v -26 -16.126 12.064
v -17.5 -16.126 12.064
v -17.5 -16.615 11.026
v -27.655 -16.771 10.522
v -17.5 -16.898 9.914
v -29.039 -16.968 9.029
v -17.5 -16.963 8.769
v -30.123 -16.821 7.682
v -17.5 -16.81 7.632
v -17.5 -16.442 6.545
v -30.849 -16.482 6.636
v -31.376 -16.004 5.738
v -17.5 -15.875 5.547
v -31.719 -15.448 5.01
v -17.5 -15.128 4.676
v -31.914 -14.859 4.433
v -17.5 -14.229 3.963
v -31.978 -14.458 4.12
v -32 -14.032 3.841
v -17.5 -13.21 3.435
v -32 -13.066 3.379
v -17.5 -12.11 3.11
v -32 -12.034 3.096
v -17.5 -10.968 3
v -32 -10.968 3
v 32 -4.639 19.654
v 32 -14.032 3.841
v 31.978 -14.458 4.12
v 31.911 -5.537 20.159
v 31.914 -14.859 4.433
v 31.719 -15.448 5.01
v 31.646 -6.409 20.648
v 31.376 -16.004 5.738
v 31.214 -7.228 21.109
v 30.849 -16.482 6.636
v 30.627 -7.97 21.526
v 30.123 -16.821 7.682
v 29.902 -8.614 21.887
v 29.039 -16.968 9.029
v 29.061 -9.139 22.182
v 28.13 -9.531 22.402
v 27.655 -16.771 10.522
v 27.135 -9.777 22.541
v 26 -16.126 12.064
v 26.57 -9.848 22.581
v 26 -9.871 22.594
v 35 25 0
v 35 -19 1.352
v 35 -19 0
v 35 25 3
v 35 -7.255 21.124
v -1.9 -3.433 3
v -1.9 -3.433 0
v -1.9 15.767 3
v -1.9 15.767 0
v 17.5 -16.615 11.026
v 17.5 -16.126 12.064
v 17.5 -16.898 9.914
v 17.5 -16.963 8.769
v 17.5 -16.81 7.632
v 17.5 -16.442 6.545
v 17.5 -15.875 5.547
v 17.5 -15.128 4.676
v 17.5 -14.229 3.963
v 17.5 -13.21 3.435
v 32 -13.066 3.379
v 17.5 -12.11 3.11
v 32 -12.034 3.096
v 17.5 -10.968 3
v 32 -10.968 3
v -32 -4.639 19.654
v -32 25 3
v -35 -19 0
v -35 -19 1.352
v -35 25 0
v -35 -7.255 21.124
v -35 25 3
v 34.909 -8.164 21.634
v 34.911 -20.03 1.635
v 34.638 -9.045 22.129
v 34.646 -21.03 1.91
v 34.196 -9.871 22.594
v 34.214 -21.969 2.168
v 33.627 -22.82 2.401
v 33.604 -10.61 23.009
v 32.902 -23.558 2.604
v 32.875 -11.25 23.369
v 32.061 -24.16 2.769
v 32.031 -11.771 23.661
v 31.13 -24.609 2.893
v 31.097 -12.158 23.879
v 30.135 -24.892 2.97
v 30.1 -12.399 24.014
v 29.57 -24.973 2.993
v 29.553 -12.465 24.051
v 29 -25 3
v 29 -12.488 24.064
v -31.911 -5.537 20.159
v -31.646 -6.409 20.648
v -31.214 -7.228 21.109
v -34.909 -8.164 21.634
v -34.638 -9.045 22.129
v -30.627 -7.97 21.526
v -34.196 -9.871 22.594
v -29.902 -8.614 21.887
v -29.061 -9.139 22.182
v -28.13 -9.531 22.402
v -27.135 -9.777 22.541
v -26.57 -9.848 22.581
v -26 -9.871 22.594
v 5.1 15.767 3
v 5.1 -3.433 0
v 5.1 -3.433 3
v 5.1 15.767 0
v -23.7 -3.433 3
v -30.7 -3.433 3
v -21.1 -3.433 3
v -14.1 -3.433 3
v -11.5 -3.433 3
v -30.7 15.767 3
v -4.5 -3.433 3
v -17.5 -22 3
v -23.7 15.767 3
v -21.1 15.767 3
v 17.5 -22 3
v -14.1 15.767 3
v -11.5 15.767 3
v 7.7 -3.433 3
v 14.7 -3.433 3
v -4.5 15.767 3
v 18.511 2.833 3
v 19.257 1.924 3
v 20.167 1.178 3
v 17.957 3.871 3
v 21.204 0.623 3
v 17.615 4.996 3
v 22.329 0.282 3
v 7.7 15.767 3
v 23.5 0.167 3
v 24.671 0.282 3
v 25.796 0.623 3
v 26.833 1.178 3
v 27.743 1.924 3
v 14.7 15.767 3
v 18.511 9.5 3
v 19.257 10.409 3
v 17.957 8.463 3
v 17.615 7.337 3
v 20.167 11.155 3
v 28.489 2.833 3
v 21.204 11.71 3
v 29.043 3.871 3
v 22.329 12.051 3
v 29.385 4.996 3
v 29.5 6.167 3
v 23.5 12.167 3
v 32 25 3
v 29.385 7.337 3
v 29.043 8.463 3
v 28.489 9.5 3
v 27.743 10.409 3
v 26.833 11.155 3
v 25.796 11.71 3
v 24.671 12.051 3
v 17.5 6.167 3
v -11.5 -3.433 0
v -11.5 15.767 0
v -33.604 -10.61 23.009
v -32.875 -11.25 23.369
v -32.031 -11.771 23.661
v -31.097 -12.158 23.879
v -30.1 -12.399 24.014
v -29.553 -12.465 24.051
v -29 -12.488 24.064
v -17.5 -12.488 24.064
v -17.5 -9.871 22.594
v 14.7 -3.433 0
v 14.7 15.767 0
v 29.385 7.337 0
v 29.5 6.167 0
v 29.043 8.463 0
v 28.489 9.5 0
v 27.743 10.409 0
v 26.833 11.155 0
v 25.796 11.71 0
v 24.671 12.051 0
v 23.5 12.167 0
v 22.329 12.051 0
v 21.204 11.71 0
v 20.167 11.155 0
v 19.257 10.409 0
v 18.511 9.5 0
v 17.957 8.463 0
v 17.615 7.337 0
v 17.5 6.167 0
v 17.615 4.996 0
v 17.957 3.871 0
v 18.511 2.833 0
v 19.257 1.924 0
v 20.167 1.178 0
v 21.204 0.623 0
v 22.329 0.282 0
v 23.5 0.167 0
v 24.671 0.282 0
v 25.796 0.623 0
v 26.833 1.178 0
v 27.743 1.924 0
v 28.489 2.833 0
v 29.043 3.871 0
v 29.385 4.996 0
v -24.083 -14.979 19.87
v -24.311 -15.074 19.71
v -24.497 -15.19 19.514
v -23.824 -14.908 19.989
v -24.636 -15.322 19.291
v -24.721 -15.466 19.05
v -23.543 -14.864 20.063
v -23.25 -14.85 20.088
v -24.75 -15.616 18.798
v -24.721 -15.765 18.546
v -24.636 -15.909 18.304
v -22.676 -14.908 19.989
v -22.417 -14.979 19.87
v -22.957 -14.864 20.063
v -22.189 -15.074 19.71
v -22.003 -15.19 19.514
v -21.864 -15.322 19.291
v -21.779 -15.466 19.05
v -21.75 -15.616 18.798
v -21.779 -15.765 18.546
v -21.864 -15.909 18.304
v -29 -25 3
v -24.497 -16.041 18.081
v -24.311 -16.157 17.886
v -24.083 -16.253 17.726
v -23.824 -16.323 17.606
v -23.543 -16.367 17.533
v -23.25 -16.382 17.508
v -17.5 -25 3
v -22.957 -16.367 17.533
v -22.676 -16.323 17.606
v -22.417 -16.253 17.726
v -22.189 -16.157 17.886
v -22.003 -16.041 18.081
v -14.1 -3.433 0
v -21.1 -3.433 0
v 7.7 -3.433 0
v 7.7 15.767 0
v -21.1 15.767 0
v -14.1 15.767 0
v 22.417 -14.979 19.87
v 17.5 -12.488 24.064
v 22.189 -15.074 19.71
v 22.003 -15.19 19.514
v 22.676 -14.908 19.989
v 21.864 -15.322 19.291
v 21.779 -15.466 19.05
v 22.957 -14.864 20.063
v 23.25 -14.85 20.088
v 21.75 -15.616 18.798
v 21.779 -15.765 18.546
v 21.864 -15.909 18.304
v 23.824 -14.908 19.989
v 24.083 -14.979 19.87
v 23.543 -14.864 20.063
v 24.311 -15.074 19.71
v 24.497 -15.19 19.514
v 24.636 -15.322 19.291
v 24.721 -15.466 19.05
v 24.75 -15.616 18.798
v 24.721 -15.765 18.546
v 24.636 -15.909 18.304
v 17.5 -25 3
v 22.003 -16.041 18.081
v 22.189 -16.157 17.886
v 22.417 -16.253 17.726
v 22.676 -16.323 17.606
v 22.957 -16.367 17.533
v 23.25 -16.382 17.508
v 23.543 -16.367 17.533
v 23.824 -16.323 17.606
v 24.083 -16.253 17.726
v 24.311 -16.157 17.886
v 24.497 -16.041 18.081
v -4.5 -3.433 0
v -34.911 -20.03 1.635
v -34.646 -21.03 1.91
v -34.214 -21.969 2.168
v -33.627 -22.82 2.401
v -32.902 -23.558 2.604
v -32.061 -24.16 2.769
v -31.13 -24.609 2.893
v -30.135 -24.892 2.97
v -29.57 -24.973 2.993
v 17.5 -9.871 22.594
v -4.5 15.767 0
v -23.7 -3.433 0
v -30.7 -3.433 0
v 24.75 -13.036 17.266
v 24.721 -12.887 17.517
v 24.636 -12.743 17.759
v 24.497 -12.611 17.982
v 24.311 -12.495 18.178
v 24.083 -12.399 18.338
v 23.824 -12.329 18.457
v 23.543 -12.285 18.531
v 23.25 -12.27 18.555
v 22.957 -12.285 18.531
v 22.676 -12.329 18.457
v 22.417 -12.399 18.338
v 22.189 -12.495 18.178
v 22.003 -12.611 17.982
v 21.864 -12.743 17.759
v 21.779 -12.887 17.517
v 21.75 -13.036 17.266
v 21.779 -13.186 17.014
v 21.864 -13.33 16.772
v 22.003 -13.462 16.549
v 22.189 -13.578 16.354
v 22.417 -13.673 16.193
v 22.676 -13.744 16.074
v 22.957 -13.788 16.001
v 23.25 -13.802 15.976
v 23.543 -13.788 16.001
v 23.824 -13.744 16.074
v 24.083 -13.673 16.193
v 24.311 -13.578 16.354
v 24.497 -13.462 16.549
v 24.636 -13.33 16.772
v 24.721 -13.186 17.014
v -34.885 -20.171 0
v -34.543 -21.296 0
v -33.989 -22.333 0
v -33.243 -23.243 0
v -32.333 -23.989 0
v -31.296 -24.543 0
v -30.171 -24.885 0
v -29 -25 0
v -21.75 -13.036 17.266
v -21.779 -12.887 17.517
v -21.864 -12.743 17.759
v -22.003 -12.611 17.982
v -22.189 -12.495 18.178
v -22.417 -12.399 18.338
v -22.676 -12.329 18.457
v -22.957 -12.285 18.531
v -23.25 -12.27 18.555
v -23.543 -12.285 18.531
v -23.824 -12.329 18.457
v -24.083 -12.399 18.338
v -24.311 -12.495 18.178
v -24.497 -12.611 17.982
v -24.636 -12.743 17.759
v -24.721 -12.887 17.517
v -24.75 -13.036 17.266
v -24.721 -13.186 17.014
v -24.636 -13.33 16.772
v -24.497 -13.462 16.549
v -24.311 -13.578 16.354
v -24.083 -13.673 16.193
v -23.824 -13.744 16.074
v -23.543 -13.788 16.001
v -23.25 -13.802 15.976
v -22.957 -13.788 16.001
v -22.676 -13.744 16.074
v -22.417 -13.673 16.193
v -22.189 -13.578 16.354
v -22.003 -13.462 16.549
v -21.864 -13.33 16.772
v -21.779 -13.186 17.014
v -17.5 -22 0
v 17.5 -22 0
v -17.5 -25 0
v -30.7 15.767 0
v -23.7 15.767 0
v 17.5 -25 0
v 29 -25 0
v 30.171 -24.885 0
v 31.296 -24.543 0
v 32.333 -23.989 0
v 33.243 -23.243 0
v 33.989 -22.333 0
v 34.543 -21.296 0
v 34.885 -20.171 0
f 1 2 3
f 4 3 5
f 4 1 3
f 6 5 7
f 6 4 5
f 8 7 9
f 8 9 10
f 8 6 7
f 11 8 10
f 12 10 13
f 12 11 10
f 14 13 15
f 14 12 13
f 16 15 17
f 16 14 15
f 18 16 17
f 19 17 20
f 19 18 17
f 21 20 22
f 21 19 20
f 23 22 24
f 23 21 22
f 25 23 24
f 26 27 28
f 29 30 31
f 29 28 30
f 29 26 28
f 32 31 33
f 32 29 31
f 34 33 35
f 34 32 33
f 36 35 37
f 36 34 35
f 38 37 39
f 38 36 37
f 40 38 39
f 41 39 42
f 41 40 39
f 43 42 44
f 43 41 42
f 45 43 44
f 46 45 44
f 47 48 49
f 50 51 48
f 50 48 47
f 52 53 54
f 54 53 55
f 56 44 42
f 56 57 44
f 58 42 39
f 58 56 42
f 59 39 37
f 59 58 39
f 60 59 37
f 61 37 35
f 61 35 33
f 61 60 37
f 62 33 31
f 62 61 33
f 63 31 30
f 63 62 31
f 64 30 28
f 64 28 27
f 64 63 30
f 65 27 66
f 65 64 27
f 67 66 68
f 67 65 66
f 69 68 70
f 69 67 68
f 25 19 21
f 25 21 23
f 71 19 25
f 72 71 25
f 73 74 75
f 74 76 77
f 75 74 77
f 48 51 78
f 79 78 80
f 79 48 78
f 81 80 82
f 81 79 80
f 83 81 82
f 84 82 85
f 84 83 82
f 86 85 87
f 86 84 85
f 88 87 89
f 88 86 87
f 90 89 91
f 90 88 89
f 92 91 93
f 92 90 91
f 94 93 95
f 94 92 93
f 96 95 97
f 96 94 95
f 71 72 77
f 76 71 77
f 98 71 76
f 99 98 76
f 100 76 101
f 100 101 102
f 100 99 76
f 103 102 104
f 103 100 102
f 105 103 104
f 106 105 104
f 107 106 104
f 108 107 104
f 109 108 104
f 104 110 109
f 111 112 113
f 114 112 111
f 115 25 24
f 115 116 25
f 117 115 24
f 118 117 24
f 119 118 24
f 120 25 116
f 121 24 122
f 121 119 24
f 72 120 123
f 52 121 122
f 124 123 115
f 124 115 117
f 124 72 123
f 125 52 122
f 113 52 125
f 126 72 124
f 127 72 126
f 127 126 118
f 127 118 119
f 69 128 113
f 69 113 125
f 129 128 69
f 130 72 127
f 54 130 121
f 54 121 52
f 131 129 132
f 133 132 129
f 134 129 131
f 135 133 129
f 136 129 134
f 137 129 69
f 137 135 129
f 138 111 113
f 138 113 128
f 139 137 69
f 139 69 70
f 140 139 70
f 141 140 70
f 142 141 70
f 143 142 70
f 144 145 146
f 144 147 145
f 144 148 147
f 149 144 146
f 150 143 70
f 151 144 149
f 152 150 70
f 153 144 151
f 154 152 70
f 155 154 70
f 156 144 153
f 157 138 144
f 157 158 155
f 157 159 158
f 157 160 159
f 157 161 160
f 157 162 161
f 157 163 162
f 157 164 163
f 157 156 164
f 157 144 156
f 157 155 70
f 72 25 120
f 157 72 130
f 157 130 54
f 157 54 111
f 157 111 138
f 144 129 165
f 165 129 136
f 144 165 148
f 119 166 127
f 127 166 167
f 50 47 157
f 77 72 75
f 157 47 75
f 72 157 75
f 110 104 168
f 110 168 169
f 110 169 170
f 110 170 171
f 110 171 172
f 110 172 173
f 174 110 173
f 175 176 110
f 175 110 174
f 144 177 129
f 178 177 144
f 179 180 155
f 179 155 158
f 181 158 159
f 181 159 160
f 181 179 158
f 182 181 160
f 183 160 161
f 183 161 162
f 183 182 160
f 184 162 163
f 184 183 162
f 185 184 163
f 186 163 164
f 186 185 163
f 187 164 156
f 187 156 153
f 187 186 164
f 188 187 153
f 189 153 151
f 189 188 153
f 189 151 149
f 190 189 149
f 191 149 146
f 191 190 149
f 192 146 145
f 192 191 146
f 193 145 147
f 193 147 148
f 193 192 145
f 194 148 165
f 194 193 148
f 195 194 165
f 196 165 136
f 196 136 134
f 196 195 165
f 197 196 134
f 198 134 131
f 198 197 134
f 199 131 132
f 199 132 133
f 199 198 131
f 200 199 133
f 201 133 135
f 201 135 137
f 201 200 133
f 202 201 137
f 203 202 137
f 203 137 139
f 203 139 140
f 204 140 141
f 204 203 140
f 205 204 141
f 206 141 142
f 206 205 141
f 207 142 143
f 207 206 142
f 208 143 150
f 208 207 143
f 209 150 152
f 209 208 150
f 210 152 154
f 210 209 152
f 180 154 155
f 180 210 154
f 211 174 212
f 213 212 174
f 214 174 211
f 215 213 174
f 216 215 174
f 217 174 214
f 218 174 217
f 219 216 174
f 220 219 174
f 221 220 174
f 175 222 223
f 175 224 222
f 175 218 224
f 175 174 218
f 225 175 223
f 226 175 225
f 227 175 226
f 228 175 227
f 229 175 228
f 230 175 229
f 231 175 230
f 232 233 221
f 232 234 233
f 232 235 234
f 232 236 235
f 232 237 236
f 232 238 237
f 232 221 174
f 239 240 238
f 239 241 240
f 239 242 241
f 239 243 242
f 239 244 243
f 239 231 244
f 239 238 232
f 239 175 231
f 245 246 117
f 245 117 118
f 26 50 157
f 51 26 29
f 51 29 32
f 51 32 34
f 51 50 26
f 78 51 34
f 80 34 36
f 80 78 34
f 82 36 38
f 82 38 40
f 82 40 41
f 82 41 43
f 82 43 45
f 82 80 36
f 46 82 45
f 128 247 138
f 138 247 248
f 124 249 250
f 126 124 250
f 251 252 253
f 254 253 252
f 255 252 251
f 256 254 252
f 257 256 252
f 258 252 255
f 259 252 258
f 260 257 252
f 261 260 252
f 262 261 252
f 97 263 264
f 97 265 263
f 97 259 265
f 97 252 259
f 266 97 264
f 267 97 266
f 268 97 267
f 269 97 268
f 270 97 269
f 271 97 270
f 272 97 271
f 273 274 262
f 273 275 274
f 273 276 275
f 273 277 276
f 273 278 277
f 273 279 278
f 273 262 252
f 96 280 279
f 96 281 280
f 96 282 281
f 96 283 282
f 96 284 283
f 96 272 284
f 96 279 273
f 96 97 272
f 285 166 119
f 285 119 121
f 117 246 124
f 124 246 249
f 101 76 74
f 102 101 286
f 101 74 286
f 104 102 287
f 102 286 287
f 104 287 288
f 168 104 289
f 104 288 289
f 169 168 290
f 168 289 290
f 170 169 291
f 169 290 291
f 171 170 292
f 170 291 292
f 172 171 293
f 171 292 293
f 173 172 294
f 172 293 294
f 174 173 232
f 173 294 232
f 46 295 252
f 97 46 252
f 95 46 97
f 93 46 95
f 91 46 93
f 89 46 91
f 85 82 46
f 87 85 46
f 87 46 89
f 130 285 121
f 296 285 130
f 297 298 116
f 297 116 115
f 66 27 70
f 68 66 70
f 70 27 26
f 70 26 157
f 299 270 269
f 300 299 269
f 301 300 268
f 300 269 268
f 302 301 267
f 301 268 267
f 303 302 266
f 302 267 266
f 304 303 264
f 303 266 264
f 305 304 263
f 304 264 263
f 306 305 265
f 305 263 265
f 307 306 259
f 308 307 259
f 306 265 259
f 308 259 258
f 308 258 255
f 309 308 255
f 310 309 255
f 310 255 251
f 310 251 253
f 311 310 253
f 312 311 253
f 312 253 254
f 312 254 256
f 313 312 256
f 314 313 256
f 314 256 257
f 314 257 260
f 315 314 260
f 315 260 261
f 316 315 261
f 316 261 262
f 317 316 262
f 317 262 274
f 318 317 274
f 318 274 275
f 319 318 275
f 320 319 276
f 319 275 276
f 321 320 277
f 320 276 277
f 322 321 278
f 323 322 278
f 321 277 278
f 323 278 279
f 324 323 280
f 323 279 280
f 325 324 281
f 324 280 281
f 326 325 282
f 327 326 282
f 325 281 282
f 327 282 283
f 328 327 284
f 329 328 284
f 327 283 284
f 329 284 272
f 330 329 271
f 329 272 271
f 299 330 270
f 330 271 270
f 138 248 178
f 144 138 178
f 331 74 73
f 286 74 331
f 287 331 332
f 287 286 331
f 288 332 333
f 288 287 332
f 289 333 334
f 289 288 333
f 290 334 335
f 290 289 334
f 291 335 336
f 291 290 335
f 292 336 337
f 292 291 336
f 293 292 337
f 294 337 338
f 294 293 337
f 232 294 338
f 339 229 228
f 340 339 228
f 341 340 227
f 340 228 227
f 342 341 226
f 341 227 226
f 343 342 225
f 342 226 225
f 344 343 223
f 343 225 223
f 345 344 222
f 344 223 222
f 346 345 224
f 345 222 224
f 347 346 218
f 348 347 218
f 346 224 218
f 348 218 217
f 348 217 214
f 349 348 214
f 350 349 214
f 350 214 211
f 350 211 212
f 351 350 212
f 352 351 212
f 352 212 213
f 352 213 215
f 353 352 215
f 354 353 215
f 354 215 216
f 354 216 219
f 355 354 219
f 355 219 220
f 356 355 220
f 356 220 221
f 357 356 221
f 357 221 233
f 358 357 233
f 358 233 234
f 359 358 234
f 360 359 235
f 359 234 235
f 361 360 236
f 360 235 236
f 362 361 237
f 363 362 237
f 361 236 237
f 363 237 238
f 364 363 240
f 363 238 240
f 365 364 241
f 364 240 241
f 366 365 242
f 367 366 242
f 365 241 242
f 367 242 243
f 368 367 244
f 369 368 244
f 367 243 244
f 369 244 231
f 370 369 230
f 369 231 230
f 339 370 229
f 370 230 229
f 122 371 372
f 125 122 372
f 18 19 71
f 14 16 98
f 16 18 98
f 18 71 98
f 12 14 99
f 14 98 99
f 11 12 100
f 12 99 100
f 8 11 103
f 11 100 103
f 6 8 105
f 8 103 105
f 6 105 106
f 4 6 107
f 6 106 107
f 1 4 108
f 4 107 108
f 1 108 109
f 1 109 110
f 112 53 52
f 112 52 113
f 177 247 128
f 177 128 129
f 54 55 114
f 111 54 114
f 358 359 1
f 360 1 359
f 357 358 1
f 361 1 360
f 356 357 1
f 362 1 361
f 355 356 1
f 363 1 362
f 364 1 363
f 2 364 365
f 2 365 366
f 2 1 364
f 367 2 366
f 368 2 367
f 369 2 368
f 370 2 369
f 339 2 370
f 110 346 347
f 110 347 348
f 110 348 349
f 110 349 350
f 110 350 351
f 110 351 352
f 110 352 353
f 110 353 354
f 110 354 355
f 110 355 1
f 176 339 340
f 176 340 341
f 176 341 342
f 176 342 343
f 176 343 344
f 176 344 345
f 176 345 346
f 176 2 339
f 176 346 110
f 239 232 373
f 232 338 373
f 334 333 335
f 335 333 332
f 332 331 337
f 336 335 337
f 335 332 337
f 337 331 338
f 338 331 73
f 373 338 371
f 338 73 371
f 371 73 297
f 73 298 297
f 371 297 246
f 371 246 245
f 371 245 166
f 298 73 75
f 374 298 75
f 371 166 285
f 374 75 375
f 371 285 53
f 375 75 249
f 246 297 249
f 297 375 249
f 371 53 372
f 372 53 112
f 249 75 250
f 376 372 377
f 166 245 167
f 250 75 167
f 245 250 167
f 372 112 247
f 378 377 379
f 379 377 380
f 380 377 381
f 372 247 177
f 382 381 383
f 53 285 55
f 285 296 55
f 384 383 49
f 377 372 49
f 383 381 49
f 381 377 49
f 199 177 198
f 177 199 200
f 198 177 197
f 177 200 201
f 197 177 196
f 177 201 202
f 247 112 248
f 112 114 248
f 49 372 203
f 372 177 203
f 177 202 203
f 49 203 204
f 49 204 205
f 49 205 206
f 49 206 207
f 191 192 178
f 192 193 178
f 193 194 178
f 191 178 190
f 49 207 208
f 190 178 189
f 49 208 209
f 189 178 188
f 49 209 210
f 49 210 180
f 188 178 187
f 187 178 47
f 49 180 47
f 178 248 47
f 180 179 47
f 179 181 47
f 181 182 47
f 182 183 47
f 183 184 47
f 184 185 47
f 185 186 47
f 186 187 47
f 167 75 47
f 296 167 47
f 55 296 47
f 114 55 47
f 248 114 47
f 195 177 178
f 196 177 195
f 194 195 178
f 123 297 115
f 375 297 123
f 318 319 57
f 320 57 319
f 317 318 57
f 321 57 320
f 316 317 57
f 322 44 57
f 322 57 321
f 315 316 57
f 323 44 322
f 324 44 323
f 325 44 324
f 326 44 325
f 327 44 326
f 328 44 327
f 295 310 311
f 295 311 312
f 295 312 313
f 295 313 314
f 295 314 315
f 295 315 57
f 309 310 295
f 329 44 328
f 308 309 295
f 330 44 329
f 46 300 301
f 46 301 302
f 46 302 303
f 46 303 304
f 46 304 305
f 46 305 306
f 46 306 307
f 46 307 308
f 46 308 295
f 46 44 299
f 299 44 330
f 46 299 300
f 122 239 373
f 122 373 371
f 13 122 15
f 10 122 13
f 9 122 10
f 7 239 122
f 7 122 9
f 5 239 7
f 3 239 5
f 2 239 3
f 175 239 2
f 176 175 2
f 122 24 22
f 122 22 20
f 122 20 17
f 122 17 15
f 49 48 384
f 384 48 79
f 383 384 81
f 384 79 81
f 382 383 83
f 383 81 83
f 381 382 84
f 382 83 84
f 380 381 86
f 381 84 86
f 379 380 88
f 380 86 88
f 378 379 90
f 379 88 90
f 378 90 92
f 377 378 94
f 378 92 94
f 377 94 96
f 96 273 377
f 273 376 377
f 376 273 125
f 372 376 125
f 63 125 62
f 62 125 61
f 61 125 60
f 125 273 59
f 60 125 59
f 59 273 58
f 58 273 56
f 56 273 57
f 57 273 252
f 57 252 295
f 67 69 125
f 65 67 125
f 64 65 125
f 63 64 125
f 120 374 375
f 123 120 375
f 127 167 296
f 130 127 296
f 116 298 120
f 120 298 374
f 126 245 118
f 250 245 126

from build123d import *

# Parameters (mm, degrees)
F3_W      = 7
F3_H      = 19.2
F3_R      = 6
F4_DEPTH  = 3
F7_DEPTH  = 3
F8_START  = -67
F8_DEPTH  = 3
F9_START  = -52.5
F9_DEPTH  = 17.5
F10_DEPTH = 17.5
F11_R     = 6
F13_R     = 1.5
F14_DEPTH = 5


with BuildPart() as f4:
    # F3 (on Top) → F4 (new body)
    with BuildSketch(Plane.XY):
        Polygon((35, 25), (-35, 25), (-35, -25), (-17.5, -25), (-17.5, -22), (17.5, -22), (17.5, -25), (35, -25), align=None)
        with Locations((-27.2, 6.1666666667)):
            Rectangle(F3_W, F3_H, mode=Mode.SUBTRACT)
        with Locations((-17.6, 6.1666666667)):
            Rectangle(F3_W, F3_H, mode=Mode.SUBTRACT)
        with Locations((-8, 6.1666666667)):
            Rectangle(F3_W, F3_H, mode=Mode.SUBTRACT)
        with Locations((1.6, 6.1666666667)):
            Rectangle(F3_W, F3_H, mode=Mode.SUBTRACT)
        with Locations((11.2, 6.1666666667)):
            Rectangle(F3_W, F3_H, mode=Mode.SUBTRACT)
        with Locations((23.5, 6.1666666667)):
            Circle(F3_R, mode=Mode.SUBTRACT)
    extrude(amount=F4_DEPTH)

    # F6 (on offset) → F7 (join)
    with BuildSketch(Plane.YZ.offset(35)):
        Polygon((-12.4875, 24.0638871947), (-25, 3), (-21.5106155706, 3), (-9.871334024, 22.5938871947), align=None)
        Polygon((-9.871334024, 22.5938871947), (-21.5106155706, 3), (25, 3), align=None)
    extrude(amount=-F7_DEPTH)

    # F6 (on offset) → F8 (join)
    with BuildSketch(Plane.YZ.offset(35).offset(F8_START)):
        Polygon((-12.4875, 24.0638871947), (-25, 3), (-21.5106155706, 3), (-9.871334024, 22.5938871947), align=None)
        Polygon((-9.871334024, 22.5938871947), (-21.5106155706, 3), (25, 3), align=None)
    extrude(amount=-F8_DEPTH)

    # F6 (on offset) → F9 (join)
    with BuildSketch(Plane.YZ.offset(35).offset(F9_START)):
        Polygon((-12.4875, 24.0638871947), (-25, 3), (-21.5106155706, 3), (-9.871334024, 22.5938871947), align=None)
    extrude(amount=-F9_DEPTH)

    # F6 (on offset) → F10 (join)
    with BuildSketch(Plane.YZ.offset(35)):
        Polygon((-12.4875, 24.0638871947), (-25, 3), (-21.5106155706, 3), (-9.871334024, 22.5938871947), align=None)
    extrude(amount=-F10_DEPTH)

    # F11
    f11_edges = [f4.edges().sort_by_distance(p)[0] for p in [
        (32, -15.690975, 12.796944),
        (-32, -15.690975, 12.796944),
        (-24.75, -21.510616, 3),
        (24.75, -21.510616, 3),
        (35, -18.74375, 13.531944),
        (-35, -18.74375, 13.531944),
        (-35, -25, 1.5),
        (35, -25, 1.5),
    ]]
    fillet(f11_edges, radius=F11_R)

    # F13 (on offset) → F14 (cut)
    with BuildSketch(Plane(origin=(0, -19.7965335432, 11.7596587786), x_dir=(1, 0, 0), z_dir=(0, -0.8597504977, 0.5107142857))):
        with Locations((-23.25, 8.1863943504)):
            Circle(F13_R)
        with Locations((23.25, 8.1863943504)):
            Circle(F13_R)
    extrude(amount=-F14_DEPTH, mode=Mode.SUBTRACT)


solid = f4.part
